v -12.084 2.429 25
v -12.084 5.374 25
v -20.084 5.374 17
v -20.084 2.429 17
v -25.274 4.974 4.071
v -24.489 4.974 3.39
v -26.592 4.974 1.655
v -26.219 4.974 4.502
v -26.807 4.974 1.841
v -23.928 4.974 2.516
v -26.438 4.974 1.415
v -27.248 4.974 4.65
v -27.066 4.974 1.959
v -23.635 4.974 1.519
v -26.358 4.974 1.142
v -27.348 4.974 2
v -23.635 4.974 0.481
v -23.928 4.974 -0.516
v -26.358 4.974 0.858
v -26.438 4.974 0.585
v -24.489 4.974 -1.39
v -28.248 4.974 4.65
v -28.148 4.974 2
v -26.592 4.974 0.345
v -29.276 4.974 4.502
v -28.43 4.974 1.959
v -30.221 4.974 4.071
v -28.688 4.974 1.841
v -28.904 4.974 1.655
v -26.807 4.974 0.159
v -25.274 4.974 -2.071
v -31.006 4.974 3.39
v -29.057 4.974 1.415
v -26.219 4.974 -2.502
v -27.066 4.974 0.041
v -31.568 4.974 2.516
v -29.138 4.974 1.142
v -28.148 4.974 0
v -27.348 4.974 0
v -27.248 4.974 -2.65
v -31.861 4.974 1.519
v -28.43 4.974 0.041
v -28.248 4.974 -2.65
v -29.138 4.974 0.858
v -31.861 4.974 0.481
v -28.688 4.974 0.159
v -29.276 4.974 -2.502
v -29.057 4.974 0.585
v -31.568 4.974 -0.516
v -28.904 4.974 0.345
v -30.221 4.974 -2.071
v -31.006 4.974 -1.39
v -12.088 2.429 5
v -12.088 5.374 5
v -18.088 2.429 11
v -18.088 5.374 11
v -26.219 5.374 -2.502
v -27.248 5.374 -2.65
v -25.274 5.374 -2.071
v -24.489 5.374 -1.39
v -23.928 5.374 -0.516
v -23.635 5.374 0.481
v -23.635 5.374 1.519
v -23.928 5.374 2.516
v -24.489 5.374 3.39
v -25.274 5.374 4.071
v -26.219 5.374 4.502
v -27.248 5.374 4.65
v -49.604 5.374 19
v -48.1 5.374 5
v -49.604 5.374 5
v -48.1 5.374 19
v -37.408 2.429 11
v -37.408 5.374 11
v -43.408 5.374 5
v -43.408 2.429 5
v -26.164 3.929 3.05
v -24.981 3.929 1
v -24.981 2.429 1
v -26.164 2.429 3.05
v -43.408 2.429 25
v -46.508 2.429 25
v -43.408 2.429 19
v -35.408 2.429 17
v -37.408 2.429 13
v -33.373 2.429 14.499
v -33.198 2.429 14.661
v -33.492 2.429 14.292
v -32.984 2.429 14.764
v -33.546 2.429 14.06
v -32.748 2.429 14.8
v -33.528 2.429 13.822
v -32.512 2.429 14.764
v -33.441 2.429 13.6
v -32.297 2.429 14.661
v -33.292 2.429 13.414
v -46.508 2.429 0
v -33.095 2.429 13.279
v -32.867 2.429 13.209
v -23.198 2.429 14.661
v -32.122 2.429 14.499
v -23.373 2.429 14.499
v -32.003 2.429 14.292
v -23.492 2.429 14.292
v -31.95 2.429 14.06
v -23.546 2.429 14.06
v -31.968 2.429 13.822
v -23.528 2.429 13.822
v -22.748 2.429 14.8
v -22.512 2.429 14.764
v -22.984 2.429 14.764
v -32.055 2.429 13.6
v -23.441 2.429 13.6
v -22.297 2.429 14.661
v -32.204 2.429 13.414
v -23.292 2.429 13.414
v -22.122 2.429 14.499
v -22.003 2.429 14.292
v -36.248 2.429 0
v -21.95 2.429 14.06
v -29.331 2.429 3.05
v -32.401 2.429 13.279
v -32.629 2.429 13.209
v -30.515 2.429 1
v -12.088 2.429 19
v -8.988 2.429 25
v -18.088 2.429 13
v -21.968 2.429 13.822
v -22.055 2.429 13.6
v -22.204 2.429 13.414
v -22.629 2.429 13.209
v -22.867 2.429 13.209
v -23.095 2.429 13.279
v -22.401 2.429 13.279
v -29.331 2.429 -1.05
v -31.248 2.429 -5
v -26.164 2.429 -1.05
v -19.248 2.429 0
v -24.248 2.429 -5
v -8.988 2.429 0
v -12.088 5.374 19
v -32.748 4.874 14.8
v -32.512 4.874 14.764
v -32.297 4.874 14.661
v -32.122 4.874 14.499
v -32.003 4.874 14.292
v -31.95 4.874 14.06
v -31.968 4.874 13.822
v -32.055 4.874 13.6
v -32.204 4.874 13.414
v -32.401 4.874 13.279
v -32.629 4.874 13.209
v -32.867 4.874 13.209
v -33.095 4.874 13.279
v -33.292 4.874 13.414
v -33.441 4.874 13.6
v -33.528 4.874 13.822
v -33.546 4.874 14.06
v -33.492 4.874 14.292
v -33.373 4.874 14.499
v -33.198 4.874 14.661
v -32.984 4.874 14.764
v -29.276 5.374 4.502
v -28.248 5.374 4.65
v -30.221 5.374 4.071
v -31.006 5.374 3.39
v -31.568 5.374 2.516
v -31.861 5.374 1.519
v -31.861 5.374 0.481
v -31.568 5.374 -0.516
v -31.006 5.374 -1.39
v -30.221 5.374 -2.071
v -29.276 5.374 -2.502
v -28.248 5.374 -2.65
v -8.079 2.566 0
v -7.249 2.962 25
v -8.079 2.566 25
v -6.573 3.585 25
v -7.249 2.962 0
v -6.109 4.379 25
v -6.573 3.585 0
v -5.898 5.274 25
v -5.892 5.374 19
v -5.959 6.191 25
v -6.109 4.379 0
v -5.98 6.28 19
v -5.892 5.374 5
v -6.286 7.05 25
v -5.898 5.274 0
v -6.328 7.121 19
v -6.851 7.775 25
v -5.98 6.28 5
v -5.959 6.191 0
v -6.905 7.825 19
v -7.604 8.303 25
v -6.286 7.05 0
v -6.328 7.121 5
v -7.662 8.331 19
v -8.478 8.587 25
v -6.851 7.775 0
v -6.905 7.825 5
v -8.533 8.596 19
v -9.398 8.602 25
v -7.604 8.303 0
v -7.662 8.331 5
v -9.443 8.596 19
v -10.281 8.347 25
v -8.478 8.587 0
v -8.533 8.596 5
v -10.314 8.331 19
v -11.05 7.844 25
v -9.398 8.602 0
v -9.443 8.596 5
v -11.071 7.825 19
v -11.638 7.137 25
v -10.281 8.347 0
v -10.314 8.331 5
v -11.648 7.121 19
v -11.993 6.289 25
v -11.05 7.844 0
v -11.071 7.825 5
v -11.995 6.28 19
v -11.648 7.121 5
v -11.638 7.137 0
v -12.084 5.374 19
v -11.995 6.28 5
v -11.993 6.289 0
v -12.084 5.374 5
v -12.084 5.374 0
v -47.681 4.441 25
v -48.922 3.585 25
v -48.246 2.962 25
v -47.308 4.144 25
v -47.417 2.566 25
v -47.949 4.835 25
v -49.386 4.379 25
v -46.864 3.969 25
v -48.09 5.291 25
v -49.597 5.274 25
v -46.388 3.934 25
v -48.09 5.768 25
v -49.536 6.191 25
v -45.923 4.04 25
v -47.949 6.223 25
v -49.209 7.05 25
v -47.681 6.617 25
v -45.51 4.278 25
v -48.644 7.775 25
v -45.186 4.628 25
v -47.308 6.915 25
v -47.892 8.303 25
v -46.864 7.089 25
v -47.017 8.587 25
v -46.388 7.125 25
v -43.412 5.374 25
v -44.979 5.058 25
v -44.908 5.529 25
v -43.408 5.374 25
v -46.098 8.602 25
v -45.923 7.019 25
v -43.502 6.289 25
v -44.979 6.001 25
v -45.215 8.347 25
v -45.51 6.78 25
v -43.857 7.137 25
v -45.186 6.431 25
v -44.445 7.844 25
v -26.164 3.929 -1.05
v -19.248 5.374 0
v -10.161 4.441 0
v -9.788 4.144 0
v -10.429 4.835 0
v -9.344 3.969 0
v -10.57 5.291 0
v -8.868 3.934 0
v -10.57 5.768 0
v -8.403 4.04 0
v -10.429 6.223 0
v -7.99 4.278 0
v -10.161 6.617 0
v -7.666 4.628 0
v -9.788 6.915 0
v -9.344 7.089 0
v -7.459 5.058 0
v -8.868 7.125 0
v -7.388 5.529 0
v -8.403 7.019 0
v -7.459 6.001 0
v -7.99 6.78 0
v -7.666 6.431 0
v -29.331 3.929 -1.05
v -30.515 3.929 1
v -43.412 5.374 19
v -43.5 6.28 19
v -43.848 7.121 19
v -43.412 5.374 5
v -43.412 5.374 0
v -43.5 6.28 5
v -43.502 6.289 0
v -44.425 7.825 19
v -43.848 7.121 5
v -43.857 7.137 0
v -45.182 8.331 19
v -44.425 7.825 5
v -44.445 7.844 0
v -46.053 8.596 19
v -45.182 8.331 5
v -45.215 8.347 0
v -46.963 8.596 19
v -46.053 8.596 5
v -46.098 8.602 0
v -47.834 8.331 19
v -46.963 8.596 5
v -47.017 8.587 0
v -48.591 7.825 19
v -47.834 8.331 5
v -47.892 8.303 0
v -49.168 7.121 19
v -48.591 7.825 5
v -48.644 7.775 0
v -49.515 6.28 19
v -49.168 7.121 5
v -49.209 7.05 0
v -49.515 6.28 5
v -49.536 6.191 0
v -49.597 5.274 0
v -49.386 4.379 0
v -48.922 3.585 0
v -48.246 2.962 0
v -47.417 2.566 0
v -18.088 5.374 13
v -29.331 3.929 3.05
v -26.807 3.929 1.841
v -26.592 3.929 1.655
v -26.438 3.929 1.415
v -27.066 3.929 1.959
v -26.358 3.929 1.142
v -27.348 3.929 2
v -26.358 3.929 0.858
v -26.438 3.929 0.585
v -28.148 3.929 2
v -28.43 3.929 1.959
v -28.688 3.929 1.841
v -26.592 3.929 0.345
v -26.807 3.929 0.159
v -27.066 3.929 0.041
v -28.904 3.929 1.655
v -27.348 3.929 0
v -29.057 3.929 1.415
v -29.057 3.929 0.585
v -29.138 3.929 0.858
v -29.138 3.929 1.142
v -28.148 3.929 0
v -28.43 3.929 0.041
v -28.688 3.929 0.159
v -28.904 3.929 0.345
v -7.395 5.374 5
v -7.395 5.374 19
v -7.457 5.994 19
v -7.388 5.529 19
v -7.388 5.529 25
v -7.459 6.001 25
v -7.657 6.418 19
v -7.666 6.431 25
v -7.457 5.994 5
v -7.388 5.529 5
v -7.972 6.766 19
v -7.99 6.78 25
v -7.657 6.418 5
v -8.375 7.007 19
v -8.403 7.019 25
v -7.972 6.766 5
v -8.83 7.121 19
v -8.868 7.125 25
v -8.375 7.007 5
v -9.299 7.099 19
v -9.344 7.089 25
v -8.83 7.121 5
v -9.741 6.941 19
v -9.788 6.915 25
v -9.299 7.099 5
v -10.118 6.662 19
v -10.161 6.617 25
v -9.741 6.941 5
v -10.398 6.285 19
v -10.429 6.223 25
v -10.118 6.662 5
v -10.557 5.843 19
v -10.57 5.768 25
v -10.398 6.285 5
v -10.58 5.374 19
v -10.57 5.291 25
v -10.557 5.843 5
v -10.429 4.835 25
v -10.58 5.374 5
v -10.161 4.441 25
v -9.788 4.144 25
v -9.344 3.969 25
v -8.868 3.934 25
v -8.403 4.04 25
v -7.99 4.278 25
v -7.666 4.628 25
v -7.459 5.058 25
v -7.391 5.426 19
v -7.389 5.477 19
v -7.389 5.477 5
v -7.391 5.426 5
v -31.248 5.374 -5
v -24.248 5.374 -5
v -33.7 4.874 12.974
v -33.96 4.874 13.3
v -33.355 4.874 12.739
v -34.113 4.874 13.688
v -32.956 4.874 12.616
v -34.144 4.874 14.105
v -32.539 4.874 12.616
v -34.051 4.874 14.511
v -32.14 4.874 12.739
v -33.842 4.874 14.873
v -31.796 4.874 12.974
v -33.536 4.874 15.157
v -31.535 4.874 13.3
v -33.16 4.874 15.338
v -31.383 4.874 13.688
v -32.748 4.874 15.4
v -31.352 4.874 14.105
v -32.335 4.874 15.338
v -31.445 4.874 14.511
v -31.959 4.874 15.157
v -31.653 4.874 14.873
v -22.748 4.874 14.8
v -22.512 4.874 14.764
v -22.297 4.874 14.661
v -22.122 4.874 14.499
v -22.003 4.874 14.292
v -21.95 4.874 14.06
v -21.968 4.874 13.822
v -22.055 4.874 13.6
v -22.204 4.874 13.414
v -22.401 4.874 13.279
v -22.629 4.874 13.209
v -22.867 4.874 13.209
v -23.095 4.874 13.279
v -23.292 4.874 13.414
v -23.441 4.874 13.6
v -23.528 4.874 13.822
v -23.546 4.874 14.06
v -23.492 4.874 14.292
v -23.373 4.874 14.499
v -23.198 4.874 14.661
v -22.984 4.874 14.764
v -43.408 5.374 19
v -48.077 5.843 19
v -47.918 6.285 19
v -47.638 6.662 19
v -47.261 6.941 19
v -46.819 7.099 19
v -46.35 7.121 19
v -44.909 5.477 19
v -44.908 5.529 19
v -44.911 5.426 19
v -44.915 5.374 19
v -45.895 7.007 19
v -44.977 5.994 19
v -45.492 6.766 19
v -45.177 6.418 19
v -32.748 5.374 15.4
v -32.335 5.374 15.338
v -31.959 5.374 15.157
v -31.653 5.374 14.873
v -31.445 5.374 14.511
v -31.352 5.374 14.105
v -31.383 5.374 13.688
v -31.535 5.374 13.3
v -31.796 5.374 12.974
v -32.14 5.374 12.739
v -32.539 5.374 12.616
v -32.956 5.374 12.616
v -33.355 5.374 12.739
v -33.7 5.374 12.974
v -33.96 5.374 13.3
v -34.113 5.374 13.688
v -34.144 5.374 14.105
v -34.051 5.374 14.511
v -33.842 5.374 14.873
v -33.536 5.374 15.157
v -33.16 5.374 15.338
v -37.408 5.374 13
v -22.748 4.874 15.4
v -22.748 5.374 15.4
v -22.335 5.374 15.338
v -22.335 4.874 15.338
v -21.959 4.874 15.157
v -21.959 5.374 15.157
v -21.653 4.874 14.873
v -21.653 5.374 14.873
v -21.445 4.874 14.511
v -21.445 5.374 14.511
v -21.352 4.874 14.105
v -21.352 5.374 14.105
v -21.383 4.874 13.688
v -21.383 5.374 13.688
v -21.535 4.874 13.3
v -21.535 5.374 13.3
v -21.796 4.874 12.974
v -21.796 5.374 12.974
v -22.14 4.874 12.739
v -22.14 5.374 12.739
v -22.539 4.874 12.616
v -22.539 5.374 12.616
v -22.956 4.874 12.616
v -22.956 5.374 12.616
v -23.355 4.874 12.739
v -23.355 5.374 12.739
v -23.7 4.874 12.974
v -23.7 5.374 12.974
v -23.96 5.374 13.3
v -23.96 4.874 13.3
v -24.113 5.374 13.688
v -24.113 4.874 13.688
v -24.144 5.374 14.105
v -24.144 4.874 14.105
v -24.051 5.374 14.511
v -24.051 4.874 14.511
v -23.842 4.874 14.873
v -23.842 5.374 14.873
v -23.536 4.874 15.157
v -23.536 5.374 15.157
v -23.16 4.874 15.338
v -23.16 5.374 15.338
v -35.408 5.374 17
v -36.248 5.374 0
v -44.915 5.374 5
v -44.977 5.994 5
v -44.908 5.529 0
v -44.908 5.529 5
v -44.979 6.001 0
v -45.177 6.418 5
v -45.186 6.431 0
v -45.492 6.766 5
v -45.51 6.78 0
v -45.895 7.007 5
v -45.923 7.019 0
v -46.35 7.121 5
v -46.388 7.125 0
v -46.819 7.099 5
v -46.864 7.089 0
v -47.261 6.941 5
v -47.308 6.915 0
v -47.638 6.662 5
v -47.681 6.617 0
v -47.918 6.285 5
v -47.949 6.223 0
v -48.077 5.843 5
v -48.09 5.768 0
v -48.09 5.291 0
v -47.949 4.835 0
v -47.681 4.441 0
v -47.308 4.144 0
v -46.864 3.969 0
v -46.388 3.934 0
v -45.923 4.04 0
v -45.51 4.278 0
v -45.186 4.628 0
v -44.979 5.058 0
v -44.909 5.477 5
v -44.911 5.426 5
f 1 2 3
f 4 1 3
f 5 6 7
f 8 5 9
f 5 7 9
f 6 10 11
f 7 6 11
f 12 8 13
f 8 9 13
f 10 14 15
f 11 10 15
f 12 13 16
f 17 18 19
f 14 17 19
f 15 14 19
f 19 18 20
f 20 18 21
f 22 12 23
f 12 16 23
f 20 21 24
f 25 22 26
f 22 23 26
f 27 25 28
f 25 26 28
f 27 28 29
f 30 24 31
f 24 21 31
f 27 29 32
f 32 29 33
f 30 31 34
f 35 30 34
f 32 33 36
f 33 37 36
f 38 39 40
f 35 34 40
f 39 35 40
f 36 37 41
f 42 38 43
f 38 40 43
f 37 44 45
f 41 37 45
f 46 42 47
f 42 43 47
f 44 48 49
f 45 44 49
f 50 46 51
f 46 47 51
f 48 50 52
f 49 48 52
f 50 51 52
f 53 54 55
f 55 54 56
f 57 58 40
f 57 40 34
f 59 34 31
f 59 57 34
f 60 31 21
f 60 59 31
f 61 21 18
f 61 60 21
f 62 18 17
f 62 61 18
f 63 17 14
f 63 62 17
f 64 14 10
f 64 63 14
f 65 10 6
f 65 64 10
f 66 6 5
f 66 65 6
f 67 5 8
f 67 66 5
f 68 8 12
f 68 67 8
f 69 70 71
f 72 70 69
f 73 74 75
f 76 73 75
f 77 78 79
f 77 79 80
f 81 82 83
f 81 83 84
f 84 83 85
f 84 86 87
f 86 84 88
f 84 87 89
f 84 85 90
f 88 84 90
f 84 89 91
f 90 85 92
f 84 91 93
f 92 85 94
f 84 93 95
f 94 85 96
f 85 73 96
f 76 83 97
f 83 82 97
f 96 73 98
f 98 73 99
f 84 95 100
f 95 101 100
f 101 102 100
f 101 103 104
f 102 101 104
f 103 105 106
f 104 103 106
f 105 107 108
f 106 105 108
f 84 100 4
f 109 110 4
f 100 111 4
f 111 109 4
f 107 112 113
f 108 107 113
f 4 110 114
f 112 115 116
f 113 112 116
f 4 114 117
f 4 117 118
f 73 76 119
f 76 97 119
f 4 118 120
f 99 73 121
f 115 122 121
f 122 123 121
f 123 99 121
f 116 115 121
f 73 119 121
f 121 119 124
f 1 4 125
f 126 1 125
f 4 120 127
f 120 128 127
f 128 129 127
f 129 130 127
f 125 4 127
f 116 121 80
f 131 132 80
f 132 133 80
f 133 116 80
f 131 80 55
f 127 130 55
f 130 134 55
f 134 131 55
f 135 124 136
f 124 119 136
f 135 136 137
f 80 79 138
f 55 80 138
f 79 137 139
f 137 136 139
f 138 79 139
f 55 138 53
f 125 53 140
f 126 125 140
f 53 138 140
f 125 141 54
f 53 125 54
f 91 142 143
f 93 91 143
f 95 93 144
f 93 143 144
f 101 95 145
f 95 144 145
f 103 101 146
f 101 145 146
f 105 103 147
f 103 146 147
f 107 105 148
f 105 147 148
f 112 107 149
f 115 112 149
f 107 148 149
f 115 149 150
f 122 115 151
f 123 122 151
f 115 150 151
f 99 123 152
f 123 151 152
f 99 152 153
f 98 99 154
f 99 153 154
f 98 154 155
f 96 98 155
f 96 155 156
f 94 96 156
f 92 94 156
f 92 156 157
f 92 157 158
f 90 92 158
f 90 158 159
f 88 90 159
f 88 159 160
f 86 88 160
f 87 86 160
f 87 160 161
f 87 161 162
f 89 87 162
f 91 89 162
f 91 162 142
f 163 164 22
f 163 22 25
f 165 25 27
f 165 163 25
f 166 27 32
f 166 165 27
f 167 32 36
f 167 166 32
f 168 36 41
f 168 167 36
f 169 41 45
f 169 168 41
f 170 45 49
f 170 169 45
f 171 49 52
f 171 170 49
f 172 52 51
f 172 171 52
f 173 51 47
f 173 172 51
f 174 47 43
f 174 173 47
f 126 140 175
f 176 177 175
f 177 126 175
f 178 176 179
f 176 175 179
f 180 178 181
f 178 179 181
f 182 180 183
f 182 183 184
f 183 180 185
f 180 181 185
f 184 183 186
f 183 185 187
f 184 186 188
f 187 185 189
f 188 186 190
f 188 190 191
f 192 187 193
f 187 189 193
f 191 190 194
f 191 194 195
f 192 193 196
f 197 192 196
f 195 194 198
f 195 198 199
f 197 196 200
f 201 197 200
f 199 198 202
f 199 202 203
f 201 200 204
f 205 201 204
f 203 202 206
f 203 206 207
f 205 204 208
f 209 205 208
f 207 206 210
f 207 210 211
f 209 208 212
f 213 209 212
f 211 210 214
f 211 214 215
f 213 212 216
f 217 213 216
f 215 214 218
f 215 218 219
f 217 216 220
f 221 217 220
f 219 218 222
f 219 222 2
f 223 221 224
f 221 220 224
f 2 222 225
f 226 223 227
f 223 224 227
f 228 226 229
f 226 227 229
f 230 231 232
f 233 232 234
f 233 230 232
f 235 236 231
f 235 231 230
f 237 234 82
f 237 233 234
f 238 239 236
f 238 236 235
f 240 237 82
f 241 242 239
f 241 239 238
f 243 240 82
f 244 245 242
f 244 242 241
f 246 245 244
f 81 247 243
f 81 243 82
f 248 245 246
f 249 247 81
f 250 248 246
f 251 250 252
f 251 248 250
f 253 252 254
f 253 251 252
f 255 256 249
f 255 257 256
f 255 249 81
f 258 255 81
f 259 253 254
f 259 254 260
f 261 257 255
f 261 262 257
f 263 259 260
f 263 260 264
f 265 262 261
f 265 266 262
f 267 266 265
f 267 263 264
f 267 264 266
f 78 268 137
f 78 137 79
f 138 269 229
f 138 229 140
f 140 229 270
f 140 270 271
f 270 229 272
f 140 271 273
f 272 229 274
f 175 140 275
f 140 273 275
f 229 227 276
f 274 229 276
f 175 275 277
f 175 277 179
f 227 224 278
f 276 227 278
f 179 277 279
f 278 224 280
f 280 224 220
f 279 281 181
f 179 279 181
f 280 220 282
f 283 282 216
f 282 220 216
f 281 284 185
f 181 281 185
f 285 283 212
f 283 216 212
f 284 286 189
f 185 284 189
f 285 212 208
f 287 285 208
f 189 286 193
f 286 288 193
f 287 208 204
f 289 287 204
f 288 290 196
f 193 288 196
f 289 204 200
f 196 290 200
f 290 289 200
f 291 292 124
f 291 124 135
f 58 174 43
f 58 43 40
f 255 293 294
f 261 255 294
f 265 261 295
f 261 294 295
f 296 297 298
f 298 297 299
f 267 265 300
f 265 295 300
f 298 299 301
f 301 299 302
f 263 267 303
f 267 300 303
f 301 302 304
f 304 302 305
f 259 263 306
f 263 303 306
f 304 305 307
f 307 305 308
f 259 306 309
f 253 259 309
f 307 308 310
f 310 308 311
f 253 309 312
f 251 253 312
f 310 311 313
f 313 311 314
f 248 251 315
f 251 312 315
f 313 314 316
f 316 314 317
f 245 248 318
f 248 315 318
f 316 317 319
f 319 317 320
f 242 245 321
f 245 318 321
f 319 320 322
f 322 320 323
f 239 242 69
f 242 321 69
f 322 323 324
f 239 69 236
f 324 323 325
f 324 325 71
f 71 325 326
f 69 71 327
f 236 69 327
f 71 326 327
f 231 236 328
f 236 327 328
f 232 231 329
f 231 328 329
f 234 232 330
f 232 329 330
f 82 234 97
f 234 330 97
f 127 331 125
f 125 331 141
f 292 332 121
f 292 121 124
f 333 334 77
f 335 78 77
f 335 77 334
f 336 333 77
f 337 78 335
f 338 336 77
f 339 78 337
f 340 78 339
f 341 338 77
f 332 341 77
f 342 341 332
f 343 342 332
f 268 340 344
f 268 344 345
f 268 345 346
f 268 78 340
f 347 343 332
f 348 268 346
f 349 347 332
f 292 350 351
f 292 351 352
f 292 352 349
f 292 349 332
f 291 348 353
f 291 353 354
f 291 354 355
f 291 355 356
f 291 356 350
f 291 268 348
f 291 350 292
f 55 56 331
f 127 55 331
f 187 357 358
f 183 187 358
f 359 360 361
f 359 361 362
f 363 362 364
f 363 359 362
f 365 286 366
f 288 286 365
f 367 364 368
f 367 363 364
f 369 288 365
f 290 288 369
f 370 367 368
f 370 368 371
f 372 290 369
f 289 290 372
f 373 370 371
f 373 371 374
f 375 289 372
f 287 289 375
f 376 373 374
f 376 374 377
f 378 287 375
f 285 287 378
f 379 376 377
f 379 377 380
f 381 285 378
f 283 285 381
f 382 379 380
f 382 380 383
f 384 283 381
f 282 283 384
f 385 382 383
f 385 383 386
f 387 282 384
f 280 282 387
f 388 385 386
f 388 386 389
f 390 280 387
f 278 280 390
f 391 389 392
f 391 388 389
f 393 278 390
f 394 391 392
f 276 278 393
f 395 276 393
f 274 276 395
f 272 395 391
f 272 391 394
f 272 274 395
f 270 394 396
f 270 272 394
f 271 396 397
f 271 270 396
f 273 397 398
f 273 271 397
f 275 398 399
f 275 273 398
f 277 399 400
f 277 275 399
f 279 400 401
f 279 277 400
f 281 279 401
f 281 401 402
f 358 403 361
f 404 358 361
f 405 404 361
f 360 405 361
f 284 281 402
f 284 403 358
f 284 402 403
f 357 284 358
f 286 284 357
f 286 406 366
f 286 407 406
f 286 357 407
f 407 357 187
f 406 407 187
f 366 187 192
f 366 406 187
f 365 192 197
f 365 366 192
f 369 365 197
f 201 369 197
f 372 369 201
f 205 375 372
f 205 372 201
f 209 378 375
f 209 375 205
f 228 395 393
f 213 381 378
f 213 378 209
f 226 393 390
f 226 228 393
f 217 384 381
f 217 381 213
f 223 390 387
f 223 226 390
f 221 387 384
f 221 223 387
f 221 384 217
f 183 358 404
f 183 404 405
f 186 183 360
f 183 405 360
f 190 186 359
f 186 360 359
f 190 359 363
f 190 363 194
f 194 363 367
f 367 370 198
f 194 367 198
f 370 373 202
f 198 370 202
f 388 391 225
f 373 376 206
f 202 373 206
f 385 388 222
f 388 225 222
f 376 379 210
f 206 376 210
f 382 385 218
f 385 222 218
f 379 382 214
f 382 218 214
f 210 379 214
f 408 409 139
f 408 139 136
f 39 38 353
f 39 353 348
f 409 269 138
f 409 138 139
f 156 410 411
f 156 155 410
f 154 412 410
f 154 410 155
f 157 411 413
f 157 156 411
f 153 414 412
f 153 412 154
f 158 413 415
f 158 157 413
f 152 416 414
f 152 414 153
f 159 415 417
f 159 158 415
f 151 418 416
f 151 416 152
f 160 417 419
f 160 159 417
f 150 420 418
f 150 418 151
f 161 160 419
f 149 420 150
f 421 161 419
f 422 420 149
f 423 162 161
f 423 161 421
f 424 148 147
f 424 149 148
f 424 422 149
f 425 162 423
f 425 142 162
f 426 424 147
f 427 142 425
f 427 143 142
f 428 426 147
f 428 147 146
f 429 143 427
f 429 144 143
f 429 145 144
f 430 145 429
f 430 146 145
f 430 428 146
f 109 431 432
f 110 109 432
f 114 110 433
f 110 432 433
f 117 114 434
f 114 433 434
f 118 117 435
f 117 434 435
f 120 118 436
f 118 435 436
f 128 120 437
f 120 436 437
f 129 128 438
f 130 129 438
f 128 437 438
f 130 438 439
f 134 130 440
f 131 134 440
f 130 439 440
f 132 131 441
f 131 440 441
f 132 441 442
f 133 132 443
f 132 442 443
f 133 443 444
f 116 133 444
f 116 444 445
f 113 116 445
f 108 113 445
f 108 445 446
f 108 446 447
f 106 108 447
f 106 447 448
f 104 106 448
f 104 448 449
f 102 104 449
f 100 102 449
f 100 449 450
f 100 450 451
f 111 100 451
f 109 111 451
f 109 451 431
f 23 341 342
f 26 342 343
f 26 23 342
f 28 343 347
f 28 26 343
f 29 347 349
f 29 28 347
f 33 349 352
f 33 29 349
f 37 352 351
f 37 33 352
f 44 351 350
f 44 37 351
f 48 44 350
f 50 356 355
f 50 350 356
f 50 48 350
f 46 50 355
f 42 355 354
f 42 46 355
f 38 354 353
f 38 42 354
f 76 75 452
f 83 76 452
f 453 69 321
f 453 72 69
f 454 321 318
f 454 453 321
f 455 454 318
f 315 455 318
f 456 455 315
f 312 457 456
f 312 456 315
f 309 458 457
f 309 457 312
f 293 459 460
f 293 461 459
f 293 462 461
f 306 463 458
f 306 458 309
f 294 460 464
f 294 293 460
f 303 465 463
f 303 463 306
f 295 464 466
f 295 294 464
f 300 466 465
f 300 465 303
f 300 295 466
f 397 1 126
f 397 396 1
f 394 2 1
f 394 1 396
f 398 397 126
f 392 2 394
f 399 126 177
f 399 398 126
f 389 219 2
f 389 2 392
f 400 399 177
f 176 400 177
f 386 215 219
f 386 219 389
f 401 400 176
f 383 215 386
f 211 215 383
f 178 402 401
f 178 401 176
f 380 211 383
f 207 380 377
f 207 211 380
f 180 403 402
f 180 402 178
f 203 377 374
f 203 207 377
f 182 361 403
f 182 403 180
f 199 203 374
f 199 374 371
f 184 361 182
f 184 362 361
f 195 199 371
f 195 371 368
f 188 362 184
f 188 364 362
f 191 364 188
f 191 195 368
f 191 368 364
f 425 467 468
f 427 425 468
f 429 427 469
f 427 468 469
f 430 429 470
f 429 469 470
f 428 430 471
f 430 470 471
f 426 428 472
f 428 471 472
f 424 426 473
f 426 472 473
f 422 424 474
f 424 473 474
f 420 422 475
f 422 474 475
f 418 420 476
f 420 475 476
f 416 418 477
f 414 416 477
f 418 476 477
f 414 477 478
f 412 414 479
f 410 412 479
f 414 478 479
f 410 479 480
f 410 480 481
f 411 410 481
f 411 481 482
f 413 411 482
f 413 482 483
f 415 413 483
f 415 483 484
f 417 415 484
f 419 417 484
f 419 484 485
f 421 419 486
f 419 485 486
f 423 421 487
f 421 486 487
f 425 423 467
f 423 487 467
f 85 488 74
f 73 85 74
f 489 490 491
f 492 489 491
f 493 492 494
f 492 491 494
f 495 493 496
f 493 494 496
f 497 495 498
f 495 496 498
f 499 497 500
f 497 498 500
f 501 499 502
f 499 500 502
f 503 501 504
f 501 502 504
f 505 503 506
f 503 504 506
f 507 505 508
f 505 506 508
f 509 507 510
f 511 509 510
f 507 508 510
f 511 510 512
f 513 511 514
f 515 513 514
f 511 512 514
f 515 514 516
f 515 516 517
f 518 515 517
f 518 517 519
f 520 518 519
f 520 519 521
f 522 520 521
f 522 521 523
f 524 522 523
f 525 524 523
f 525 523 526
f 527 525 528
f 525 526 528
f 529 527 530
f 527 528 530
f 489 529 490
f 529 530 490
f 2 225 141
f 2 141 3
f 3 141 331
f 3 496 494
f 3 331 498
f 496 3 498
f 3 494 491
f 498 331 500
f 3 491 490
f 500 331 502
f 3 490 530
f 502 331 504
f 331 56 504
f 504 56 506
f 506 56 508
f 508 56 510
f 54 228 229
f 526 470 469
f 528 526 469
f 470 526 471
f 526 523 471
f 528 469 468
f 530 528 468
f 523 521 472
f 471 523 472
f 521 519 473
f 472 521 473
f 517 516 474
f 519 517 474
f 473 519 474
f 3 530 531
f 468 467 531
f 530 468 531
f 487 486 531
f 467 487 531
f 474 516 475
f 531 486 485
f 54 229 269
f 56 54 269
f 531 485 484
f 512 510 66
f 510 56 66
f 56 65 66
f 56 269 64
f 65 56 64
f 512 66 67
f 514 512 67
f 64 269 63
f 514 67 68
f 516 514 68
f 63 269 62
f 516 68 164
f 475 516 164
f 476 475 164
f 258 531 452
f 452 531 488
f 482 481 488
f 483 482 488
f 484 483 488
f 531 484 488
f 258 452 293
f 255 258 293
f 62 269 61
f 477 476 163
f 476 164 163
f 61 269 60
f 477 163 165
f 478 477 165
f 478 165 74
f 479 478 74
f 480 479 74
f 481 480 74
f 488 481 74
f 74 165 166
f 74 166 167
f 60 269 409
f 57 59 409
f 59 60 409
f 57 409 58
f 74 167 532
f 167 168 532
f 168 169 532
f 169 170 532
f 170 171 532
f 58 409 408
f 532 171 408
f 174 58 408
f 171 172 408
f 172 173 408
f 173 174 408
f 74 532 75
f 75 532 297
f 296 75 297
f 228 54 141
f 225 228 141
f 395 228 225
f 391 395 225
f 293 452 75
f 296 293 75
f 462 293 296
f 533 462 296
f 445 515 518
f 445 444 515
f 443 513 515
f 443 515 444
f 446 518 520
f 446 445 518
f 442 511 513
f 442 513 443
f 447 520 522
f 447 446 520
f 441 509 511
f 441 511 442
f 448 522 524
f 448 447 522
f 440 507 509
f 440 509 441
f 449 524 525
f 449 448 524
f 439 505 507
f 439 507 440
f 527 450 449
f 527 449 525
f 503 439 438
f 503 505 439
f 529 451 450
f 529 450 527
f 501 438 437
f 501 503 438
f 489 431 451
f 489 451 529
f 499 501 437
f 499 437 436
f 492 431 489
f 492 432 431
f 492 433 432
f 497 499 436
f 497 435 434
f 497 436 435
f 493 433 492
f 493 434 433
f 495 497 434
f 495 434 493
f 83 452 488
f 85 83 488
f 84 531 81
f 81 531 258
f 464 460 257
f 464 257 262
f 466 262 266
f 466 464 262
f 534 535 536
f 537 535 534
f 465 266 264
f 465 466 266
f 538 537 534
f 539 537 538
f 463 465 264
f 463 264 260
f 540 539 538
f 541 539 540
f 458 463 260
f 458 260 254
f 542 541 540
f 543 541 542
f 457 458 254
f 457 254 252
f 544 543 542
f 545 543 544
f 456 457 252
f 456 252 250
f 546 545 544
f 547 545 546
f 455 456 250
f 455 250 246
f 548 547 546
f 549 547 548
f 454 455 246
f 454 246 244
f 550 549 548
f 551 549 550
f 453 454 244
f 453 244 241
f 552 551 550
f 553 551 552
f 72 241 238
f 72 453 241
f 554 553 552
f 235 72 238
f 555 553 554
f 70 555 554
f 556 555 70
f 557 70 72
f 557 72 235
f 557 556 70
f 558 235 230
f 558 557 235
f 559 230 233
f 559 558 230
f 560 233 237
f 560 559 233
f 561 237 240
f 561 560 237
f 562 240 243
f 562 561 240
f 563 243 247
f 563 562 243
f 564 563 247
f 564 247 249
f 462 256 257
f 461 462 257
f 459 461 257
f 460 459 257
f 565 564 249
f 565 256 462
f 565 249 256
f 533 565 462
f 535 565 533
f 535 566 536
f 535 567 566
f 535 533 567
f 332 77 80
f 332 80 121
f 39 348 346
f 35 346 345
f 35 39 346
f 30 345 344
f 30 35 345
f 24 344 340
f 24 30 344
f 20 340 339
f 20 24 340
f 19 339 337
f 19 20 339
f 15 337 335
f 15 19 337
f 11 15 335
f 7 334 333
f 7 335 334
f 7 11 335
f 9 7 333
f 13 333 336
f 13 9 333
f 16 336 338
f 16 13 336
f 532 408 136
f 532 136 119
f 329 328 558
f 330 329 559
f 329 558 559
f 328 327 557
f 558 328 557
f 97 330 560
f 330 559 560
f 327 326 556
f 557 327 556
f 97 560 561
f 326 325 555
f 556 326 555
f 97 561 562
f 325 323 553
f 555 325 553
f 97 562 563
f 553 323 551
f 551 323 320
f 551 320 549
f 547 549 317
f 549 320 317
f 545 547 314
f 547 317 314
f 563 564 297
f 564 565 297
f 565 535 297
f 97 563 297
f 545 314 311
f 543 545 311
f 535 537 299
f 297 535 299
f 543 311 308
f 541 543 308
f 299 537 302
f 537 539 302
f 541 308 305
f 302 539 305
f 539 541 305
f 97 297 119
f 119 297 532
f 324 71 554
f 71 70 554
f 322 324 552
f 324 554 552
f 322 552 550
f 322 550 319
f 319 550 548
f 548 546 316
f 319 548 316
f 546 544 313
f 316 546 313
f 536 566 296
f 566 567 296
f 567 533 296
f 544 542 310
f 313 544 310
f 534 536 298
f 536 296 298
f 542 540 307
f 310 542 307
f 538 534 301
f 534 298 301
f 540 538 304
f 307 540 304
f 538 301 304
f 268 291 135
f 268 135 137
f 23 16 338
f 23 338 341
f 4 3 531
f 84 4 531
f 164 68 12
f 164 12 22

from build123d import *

# Parameters (mm, degrees)
SKETCH_1_R           = 3.1
SKETCH_1_R_2         = 1.6
EXTRUDE_1_DEPTH      = 25
EXTRUDE_2_DEPTH      = 2.945
CUT_EXTRUDE_1_DEPTH  = 56.64644355
CUT_EXTRUDE_START    = -1.5
CUT_EXTRUDE_4_DEPTH  = 1.5
SKETCH_6_R           = 0.8
CUT_EXTRUDE_5_DEPTH  = 56.64644355
CUT_EXTRUDE_6_DEPTH  = 56.64644355
SKETCH_9_W           = 14
SKETCH_9_H           = 3.255
CUT_EXTRUDE_9_DEPTH  = 46.904396246
SKETCH_10_R          = 1.4
CUT_EXTRUDE_11_DEPTH = 0.5
CUT_EXTRUDE_12_DEPTH = 0.4


with BuildPart() as part:
    # 草图1 → 凸台-拉伸1 (new body)
    # profile 1 of 3: a face of its own
    with BuildSketch(Plane.XY):
        with Locations((-46.507778168, 5.529205914)):
            Circle(SKETCH_1_R)
        with Locations((-46.507778168, 5.529205914)):
            Circle(SKETCH_1_R_2, mode=Mode.SUBTRACT)
    # profile 2 of 3: a face of its own
    with BuildSketch(Plane.XY):
        with BuildLine():
            ThreePointArc((-43.411655593, 5.374205914), (-44.371250611, 3.283042519), (-46.507778168, 2.429205914))
            Line((-46.507778168, 2.429205914), (-8.987778168, 2.429205914))
            ThreePointArc((-8.987778168, 2.429205914), (-11.124305724, 3.283042519), (-12.083900743, 5.374205914))
            Line((-12.083900743, 5.374205914), (-43.411655593, 5.374205914))
        make_face()
    # profile 3 of 3: a face of its own
    with BuildSketch(Plane.XY):
        with Locations((-8.987778168, 5.529205914)):
            Circle(SKETCH_1_R)
        with Locations((-8.987778168, 5.529205914)):
            Circle(SKETCH_1_R_2, mode=Mode.SUBTRACT)
    extrude(amount=EXTRUDE_1_DEPTH)

    # 草图2 → 凸台-拉伸2 (add)
    with BuildSketch(Plane(origin=(0, 5.374205914, 0), x_dir=(1, 0, 0), z_dir=(0, 1, 0))):
        Polygon((-19.247778168, 0), (-24.247778168, 5), (-31.247778168, 5), (-36.247778168, 0), align=None)
    extrude(amount=-EXTRUDE_2_DEPTH)

    # 草图3 → 切除-拉伸1 (cut, through all)
    with BuildSketch(Plane(origin=(0, 5.374205914, 0), x_dir=(1, 0, 0), z_dir=(0, 1, 0))):
        with BuildLine():
            Line((-28.147778168, 0), (-27.347778168, 0))
            ThreePointArc((-27.347778168, 0), (-26.347778168, -1), (-27.347778168, -2))
            Line((-27.347778168, -2), (-28.147778168, -2))
            ThreePointArc((-28.147778168, -2), (-29.147778168, -1), (-28.147778168, 0))
        make_face()
    extrude(amount=-CUT_EXTRUDE_1_DEPTH, mode=Mode.SUBTRACT)

    # 草图5 → 切除-拉伸4 (cut)
    # profile 1 of 3: a face of its own
    with BuildSketch(Plane(origin=(0, 2.429205914, 0), x_dir=(-1, 0, 0), z_dir=(0, -1, 0)).offset(CUT_EXTRUDE_START)):
        Polygon((25.780642064, -1), (26.964210116, 1.05), (26.164210116, 1.05), (24.980642064, -1), (26.164210116, -3.05), (26.964210116, -3.05), align=None)
    # profile 2 of 3: a face of its own
    with BuildSketch(Plane(origin=(0, 2.429205914, 0), x_dir=(-1, 0, 0), z_dir=(0, -1, 0)).offset(CUT_EXTRUDE_START)):
        Polygon((28.53134622, -3.05), (29.714914272, -1), (28.53134622, 1.05), (26.964210116, 1.05), (25.780642064, -1), (26.964210116, -3.05), align=None)
        with BuildLine():
            ThreePointArc((27.347778168, -2), (26.347778168, -1), (27.347778168, 0))
            Line((27.347778168, 0), (28.147778168, 0))
            ThreePointArc((28.147778168, 0), (29.147778168, -1), (28.147778168, -2))
            Line((28.147778168, -2), (27.347778168, -2))
        make_face(mode=Mode.SUBTRACT)
    # profile 3 of 3: a face of its own
    with BuildSketch(Plane(origin=(0, 2.429205914, 0), x_dir=(-1, 0, 0), z_dir=(0, -1, 0)).offset(CUT_EXTRUDE_START)):
        Polygon((28.53134622, 1.05), (29.714914272, -1), (28.53134622, -3.05), (29.33134622, -3.05), (30.514914272, -1), (29.33134622, 1.05), align=None)
    extrude(amount=CUT_EXTRUDE_4_DEPTH, mode=Mode.SUBTRACT)

    # 草图6 → 切除-拉伸5 (cut, through all)
    with BuildSketch(Plane(origin=(0, 5.374205914, 0), x_dir=(1, 0, 0), z_dir=(0, 1, 0))):
        with Locations(Location((-32.747778168, -14, 0), (0, 0, 270))):
            Circle(SKETCH_6_R)
        with Locations(Location((-22.747778168, -14, 0), (0, 0, 270))):
            Circle(SKETCH_6_R)
    extrude(amount=-CUT_EXTRUDE_5_DEPTH, mode=Mode.SUBTRACT)

    # 草图7 → 切除-拉伸6 (cut, through all)
    with BuildSketch(Plane(origin=(0, 5.374205914, 0), x_dir=(1, 0, 0), z_dir=(0, 1, 0))):
        Polygon((-35.407778168, -17), (-43.407778168, -25), (-12.083900743, -25), (-20.083900743, -17), align=None)
        Polygon((-37.407778168, -13), (-37.407778168, -11), (-43.407778168, -5), (-43.407778168, -19), align=None)
        Polygon((-12.087778168, -5), (-18.087778168, -11), (-18.087778168, -13), (-12.087778168, -19), align=None)
    extrude(amount=-CUT_EXTRUDE_6_DEPTH, mode=Mode.SUBTRACT)

    # 草图9 → 切除-拉伸9 (cut, through all)
    with BuildSketch(Plane.ZY.offset(12.087778168)):
        with Locations((12, 7.001705914)):
            Rectangle(SKETCH_9_W, SKETCH_9_H)
    cut_extrude_9 = extrude(amount=-CUT_EXTRUDE_9_DEPTH, mode=Mode.SUBTRACT)

    # 镜向1: 切除-拉伸9 across plane
    add(cut_extrude_9.mirror(Plane(origin=(-27.747778168, 0, 0), x_dir=(0, 0, 1), z_dir=(1, 0, 0))), mode=Mode.SUBTRACT)

    # 草图10 → 切除-拉伸11 (cut)
    with BuildSketch(Plane(origin=(0, 5.374205914, 0), x_dir=(1, 0, 0), z_dir=(0, 1, 0))):
        with Locations(Location((-22.747778168, -14, 0), (0, 0, 270))):
            Circle(SKETCH_10_R)
        with Locations(Location((-32.747778168, -14, 0), (0, 0, 270))):
            Circle(SKETCH_10_R)
    extrude(amount=-CUT_EXTRUDE_11_DEPTH, mode=Mode.SUBTRACT)

    # 草图11 → 切除-拉伸12 (cut)
    with BuildSketch(Plane(origin=(0, 5.374205914, 0), x_dir=(1, 0, 0), z_dir=(0, 1, 0))):
        with BuildLine():
            Line((-27.247778168, -4.65), (-28.247778168, -4.65))
            ThreePointArc((-28.247778168, -4.65), (-31.897778168, -1), (-28.247778168, 2.65))
            Line((-28.247778168, 2.65), (-27.247778168, 2.65))
            ThreePointArc((-27.247778168, 2.65), (-23.597778168, -1), (-27.247778168, -4.65))
        make_face()
    extrude(amount=-CUT_EXTRUDE_12_DEPTH, mode=Mode.SUBTRACT)


solid = part.part
